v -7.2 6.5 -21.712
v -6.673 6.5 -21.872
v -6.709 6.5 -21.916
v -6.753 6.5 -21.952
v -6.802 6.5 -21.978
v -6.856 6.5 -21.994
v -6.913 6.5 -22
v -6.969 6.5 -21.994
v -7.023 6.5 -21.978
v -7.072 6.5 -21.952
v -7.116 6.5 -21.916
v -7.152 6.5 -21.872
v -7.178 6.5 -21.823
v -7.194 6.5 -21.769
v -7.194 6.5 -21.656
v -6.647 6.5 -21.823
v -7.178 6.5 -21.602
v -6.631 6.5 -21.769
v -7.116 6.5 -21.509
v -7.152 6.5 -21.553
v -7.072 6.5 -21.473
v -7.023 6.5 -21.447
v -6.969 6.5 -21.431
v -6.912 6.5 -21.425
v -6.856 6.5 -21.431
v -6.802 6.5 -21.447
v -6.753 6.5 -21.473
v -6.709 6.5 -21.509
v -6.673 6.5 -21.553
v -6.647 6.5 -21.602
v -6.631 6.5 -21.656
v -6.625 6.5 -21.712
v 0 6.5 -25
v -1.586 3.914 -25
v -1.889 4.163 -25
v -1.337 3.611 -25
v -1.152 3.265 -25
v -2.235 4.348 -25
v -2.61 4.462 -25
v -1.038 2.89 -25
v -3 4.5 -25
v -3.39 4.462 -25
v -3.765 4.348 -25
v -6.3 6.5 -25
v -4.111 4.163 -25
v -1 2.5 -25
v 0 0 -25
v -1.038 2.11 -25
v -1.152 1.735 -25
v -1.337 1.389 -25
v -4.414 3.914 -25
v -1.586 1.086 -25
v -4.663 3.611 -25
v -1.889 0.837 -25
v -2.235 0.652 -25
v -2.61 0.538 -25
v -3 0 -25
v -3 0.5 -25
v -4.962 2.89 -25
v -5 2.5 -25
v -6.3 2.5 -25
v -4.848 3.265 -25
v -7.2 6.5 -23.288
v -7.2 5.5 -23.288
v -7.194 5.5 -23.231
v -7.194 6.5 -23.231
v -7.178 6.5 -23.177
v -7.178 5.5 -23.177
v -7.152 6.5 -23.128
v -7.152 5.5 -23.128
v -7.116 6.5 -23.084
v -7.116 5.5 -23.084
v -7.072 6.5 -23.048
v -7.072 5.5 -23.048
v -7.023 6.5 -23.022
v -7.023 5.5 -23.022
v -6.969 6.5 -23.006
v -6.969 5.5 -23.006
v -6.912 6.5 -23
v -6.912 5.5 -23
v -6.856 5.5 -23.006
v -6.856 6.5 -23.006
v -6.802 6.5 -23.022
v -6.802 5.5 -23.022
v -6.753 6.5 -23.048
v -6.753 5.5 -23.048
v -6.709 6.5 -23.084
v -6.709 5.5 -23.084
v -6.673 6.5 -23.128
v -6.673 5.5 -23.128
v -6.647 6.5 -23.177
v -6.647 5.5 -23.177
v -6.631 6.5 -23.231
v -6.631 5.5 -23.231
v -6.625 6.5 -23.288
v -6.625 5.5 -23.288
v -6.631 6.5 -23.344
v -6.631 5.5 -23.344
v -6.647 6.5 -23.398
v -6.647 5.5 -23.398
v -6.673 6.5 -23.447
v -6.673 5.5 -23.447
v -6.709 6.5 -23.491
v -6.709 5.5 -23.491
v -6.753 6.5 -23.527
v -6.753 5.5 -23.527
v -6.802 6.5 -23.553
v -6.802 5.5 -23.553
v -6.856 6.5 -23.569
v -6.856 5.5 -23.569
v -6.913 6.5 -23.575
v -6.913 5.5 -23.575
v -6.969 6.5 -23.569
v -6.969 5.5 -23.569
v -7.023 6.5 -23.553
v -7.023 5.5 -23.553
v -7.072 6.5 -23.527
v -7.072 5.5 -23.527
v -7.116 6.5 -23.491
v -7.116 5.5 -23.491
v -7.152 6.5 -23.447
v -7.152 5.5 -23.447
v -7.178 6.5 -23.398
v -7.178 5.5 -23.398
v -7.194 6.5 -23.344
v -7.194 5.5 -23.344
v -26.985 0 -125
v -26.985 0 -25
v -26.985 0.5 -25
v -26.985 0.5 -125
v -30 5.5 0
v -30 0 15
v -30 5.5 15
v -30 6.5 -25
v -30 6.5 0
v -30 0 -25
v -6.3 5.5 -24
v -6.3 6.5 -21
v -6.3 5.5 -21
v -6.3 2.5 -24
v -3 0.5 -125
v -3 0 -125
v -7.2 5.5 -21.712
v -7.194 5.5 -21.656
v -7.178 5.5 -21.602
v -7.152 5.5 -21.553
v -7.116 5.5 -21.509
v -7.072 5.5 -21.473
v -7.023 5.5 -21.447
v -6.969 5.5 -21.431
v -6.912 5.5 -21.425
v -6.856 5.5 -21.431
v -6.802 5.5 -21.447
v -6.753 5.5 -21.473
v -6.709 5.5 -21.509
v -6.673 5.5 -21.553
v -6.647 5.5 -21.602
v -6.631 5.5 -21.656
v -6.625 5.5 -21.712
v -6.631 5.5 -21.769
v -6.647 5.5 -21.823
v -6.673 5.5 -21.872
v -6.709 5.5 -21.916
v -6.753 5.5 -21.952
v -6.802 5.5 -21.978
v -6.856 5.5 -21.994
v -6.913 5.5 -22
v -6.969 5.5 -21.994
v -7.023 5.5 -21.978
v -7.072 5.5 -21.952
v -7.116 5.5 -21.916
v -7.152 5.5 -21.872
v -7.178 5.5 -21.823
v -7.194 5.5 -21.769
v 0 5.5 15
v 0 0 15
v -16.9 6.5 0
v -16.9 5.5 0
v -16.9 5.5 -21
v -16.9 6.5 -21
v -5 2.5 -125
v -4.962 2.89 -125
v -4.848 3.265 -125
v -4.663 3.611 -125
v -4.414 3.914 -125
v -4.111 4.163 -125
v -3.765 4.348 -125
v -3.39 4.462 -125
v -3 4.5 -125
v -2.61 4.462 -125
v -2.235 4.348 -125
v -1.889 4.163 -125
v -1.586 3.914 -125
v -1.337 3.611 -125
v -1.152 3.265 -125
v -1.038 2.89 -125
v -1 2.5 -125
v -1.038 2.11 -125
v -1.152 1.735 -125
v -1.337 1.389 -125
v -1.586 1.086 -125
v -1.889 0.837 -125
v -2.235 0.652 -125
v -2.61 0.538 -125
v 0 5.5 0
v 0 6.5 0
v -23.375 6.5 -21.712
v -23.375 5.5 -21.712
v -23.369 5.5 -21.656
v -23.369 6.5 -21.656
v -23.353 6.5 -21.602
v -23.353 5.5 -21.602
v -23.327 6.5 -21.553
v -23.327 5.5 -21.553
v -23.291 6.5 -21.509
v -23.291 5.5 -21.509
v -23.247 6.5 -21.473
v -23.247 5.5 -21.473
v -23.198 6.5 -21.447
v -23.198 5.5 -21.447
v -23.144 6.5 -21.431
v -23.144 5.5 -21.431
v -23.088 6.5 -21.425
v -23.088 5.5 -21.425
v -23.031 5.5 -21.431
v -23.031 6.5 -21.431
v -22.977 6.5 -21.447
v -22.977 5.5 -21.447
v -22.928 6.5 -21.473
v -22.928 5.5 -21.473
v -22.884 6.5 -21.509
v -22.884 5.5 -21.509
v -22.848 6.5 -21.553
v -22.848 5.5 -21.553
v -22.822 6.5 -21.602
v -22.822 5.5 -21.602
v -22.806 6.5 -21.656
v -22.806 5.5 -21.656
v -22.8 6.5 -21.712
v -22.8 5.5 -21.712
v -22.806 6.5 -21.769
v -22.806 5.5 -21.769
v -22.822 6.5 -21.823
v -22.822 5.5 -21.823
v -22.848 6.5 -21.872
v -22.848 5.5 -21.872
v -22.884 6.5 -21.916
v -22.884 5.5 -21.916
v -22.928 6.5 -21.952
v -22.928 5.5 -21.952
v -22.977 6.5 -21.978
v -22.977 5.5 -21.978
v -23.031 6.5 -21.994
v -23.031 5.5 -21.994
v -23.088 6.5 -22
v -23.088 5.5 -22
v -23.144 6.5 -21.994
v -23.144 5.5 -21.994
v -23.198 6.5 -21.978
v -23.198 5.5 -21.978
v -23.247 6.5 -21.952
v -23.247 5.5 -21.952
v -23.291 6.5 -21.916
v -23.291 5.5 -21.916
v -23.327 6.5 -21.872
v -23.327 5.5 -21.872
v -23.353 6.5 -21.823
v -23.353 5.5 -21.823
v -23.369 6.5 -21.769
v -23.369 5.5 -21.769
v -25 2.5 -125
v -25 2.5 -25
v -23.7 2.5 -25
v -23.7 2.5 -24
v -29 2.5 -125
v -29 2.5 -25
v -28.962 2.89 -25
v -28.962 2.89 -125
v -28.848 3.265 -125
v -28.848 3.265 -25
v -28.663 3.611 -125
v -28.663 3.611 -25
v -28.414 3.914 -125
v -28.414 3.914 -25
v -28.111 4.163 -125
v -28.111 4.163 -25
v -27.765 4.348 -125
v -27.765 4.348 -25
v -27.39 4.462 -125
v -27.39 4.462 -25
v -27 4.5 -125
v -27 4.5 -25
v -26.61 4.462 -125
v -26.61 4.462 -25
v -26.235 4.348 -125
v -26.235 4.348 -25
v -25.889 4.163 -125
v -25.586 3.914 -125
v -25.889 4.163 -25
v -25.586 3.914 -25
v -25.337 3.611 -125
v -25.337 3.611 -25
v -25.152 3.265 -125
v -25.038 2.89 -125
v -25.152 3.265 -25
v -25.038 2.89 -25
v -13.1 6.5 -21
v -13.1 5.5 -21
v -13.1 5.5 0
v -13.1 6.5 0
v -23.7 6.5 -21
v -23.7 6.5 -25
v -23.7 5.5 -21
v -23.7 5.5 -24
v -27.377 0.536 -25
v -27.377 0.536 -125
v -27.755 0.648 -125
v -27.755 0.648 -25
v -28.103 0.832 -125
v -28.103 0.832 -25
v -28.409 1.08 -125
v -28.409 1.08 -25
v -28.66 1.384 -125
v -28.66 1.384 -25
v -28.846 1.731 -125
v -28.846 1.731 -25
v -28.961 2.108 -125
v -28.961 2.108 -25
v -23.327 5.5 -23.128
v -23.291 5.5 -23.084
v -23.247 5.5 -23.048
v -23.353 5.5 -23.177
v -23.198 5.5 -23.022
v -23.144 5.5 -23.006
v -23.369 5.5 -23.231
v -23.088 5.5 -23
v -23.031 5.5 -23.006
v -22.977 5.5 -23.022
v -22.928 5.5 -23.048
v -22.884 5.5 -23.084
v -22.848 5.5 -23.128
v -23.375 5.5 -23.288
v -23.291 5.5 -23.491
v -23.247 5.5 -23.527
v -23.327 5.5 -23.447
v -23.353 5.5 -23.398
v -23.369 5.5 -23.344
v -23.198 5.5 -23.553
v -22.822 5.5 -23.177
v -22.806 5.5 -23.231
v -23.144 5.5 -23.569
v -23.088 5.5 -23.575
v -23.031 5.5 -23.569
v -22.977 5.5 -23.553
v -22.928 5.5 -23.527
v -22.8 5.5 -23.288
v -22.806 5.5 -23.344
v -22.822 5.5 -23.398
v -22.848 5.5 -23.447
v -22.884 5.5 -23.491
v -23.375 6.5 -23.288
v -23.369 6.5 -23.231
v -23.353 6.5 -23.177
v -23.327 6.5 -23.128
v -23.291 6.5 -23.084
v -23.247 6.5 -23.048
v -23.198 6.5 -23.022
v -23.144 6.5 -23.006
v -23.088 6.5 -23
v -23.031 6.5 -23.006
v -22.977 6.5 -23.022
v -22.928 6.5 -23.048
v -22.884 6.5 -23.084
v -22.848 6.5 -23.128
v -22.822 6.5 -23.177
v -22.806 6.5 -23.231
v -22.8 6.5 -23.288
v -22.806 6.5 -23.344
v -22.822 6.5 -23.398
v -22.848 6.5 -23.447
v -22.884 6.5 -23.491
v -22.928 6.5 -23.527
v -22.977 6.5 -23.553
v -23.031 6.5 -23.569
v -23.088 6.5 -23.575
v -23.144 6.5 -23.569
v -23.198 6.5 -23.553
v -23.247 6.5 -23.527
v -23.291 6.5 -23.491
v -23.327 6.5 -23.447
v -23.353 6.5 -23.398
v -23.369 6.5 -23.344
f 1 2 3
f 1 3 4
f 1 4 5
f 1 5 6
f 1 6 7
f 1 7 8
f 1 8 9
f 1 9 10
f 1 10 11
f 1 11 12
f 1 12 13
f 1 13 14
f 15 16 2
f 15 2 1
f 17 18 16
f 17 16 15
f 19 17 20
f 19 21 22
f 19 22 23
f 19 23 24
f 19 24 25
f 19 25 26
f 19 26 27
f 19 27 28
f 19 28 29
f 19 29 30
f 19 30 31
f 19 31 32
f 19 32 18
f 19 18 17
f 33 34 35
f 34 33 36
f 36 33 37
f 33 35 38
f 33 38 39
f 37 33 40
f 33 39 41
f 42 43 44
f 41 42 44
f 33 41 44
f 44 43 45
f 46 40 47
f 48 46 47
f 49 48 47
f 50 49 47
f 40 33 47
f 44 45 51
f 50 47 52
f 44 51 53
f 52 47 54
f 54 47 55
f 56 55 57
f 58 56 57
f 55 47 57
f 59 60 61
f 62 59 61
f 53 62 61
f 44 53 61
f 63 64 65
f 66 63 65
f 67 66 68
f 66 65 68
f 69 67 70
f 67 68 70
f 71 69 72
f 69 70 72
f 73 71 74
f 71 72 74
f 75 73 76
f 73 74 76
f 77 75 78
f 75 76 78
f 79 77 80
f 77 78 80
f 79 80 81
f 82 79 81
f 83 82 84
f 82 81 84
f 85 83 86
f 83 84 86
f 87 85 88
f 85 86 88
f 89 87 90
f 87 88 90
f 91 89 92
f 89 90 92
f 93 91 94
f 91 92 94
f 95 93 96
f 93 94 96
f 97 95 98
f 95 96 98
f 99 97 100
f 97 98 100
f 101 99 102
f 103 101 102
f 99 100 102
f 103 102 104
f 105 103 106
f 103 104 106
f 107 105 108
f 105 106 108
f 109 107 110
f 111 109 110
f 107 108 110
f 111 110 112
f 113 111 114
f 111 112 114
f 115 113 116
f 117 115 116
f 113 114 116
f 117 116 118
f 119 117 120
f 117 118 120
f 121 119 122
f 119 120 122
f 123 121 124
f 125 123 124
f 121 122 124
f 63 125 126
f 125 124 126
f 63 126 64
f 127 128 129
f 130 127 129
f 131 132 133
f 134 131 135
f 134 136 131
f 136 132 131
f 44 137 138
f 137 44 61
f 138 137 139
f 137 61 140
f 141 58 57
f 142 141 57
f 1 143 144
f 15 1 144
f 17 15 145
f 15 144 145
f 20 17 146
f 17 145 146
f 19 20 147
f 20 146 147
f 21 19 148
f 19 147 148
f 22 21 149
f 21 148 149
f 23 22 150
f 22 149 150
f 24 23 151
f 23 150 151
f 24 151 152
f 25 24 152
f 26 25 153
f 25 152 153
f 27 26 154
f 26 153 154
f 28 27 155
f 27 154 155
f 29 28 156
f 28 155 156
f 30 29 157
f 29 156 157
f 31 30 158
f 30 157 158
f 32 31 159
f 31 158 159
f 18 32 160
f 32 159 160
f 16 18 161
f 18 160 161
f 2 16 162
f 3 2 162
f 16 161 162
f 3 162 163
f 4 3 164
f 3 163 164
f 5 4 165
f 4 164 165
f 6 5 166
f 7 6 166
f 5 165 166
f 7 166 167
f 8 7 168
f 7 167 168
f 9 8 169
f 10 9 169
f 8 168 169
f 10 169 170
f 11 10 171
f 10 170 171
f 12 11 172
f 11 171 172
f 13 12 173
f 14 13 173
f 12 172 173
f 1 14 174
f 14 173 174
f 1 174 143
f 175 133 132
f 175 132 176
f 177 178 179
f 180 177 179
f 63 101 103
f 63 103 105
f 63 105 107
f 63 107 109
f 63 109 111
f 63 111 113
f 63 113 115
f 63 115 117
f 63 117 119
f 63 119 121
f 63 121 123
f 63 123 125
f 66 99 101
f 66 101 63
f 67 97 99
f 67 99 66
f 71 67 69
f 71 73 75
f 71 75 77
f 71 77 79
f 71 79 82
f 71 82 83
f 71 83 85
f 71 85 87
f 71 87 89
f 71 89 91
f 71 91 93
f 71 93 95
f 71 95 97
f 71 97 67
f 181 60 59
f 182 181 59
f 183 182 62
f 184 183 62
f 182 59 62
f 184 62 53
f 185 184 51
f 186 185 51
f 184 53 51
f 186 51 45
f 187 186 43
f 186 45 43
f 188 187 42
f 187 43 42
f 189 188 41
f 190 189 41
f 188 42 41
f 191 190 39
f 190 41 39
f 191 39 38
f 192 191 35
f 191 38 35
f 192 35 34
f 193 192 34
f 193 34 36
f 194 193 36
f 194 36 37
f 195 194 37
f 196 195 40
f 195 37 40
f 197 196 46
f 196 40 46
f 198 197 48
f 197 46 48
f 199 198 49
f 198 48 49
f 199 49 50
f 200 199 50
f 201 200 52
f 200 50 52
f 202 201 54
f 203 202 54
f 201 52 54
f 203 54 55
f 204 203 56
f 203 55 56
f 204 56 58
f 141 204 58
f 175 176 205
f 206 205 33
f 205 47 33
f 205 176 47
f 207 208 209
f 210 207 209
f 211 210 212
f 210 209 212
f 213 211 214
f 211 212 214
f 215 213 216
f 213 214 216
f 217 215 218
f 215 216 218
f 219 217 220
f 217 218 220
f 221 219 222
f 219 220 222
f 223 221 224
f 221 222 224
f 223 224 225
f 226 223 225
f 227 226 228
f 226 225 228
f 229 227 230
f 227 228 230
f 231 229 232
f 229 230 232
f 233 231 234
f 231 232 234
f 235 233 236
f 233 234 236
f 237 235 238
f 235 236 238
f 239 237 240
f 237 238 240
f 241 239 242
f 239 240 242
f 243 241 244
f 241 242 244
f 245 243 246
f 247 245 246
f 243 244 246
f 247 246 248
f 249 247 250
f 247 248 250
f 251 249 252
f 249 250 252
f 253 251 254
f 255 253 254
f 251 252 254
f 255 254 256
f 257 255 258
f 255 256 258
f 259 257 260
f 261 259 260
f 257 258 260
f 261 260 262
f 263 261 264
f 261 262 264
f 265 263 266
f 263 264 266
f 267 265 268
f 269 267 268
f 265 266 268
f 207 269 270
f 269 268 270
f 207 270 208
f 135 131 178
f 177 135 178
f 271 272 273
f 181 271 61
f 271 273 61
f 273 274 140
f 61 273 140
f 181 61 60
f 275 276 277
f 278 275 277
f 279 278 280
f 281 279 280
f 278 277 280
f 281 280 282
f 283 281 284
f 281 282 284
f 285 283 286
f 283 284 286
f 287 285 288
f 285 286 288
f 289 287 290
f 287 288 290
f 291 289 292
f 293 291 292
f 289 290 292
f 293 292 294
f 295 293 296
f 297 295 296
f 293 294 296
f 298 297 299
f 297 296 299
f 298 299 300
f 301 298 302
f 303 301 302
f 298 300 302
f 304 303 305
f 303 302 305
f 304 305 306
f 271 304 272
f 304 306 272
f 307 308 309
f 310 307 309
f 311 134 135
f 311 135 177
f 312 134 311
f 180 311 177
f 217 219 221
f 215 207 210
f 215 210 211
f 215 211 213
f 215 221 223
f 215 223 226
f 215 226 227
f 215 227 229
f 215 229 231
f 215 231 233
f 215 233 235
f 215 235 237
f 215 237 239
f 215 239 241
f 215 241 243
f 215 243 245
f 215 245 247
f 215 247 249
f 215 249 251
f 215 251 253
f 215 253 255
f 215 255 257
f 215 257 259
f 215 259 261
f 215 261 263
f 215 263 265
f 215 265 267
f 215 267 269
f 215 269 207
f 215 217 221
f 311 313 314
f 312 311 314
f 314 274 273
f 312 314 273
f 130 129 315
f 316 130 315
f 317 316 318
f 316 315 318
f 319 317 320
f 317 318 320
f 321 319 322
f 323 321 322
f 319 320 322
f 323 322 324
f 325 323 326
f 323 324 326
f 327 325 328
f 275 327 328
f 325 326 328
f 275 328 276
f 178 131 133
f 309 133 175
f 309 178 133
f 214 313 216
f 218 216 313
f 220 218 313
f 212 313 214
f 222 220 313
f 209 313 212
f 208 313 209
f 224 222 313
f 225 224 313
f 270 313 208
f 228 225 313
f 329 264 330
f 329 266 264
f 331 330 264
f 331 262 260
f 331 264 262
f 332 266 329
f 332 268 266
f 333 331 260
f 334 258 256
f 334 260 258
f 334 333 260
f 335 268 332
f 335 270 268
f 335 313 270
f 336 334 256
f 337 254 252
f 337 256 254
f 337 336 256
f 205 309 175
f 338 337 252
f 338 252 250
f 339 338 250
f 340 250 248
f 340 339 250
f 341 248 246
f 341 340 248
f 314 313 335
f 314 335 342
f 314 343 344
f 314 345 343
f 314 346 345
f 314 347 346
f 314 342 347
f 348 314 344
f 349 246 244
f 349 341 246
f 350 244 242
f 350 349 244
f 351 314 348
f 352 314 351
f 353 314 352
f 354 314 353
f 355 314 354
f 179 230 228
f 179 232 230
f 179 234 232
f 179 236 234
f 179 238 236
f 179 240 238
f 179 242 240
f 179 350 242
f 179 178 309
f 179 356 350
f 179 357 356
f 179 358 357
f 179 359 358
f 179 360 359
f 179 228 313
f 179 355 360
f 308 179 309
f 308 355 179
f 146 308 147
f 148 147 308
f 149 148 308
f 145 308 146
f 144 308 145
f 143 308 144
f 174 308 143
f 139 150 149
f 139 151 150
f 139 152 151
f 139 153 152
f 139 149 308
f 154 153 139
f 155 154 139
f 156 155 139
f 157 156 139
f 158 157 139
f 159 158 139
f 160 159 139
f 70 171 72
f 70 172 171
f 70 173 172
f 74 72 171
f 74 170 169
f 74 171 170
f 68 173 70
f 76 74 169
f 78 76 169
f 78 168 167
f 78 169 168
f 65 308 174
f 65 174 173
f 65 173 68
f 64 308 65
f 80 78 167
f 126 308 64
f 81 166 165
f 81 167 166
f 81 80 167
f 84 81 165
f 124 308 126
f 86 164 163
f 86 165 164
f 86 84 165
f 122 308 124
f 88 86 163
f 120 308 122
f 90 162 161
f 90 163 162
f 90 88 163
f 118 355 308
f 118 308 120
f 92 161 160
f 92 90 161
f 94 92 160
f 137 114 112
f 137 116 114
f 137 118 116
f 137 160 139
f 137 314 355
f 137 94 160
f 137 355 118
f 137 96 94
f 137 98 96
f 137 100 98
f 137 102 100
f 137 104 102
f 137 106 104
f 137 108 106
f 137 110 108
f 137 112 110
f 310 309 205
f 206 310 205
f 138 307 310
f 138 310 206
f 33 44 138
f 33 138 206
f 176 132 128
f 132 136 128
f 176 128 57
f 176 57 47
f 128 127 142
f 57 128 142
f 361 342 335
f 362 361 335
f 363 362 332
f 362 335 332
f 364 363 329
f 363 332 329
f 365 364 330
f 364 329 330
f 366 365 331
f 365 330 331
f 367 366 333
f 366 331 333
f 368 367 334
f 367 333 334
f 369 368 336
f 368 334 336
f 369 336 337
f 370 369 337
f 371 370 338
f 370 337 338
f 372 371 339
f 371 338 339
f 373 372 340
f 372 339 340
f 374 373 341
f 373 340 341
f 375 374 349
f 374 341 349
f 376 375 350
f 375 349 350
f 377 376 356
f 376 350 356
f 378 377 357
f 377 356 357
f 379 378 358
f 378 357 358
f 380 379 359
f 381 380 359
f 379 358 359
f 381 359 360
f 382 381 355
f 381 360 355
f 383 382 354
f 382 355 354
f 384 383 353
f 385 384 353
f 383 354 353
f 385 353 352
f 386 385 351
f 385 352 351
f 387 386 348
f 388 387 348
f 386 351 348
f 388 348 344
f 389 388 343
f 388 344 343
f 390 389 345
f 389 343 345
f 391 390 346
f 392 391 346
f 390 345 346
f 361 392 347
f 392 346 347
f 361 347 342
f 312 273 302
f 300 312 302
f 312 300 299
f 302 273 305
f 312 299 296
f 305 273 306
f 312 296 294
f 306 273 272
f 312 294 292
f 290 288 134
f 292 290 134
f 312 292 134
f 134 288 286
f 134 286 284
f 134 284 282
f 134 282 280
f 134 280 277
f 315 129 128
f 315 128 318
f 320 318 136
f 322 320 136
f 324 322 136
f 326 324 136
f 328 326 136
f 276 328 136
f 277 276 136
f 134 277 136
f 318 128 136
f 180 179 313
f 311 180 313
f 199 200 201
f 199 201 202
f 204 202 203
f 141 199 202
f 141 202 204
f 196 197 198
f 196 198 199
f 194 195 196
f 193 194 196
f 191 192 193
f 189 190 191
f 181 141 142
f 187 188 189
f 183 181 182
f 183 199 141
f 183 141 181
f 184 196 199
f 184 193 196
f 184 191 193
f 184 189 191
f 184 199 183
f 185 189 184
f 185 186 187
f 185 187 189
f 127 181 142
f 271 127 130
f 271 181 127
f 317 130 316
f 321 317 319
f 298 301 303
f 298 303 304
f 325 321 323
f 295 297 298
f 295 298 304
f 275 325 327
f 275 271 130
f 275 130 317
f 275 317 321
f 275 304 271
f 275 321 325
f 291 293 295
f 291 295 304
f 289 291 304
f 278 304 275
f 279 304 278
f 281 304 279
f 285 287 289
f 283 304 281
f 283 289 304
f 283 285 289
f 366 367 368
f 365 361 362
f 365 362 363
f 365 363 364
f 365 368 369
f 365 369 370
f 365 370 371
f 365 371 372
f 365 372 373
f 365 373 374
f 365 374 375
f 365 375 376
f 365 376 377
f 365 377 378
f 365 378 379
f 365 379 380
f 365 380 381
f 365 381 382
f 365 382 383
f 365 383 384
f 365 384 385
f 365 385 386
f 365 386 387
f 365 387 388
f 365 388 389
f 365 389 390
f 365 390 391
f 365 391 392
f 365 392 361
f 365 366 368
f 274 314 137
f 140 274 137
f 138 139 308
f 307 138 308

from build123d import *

# Parameters (mm, degrees)
SKETCH1_W            = 30
SKETCH1_H            = 5.5
BOSS_EXTRUDE1_DEPTH  = 25
BOSS_EXTRUDE3_DEPTH  = 100
SKETCH5_R            = 0.2875
BOSS_EXTRUDE9_DEPTH  = 1
SKETCH5_10_W         = 17.4
SKETCH5_10_H         = 1
CUT_EXTRUDE1_DEPTH   = 3
SKETCH1_5_W          = 30
SKETCH1_5_H          = 5.5
BOSS_EXTRUDE11_DEPTH = 15


with BuildPart() as part:
    # Sketch1 → Boss-Extrude1 (new body)
    with BuildSketch(Plane.XY):
        with Locations((-15, 2.75)):
            Rectangle(SKETCH1_W, SKETCH1_H)
    extrude(amount=-BOSS_EXTRUDE1_DEPTH)

    # Sketch3 → Boss-Extrude3 (add)
    with BuildSketch(Plane(origin=(0, 0, -25), x_dir=(-1, 0, 0), z_dir=(0, 0, -1))):
        with BuildLine():
            ThreePointArc((5, 2.5), (1.585786438, 3.914213562), (3, 0.5))
            Line((3, 0.5), (3, 0))
            Line((3, 0), (26.984705643, 0))
            Line((26.984705643, 0), (26.984705643, 0.50005848))
            ThreePointArc((26.984705643, 0.50005848), (28.419610636, 3.908795813), (25, 2.5))
            Line((25, 2.5), (5, 2.5))
        make_face()
    extrude(amount=BOSS_EXTRUDE3_DEPTH)

    # Sketch5 → Boss-Extrude9 (add)
    with BuildSketch(Plane(origin=(0, 5.5, 0), x_dir=(1, 0, 0), z_dir=(0, 1, 0))):
        Polygon((-6.3, 25), (-6.3, 21), (-13.1, 21), (-13.1, 0), (0, 0), (0, 25), align=None)
        Polygon((-16.9, 0), (-16.9, 21), (-23.7, 21), (-23.7, 25), (-30, 25), (-30, 0), align=None)
        with Locations((-6.9125, 21.7125)):
            Circle(SKETCH5_R)
        with Locations((-6.9125, 23.2875)):
            Circle(SKETCH5_R)
        with Locations((-23.0875, 21.7125)):
            Circle(SKETCH5_R)
        with Locations((-23.0875, 23.2875)):
            Circle(SKETCH5_R)
    extrude(amount=BOSS_EXTRUDE9_DEPTH)

    # Sketch5<10> → Cut-Extrude1 (cut)
    with BuildSketch(Plane(origin=(0, 5.5, 0), x_dir=(1, 0, 0), z_dir=(0, 1, 0))):
        with Locations((-15, 24.5)):
            Rectangle(SKETCH5_10_W, SKETCH5_10_H)
    extrude(amount=-CUT_EXTRUDE1_DEPTH, mode=Mode.SUBTRACT)

    # Sketch1<5> → Boss-Extrude11 (add)
    with BuildSketch(Plane.XY):
        with Locations((-15, 2.75)):
            Rectangle(SKETCH1_5_W, SKETCH1_5_H)
    extrude(amount=BOSS_EXTRUDE11_DEPTH)


solid = part.part
